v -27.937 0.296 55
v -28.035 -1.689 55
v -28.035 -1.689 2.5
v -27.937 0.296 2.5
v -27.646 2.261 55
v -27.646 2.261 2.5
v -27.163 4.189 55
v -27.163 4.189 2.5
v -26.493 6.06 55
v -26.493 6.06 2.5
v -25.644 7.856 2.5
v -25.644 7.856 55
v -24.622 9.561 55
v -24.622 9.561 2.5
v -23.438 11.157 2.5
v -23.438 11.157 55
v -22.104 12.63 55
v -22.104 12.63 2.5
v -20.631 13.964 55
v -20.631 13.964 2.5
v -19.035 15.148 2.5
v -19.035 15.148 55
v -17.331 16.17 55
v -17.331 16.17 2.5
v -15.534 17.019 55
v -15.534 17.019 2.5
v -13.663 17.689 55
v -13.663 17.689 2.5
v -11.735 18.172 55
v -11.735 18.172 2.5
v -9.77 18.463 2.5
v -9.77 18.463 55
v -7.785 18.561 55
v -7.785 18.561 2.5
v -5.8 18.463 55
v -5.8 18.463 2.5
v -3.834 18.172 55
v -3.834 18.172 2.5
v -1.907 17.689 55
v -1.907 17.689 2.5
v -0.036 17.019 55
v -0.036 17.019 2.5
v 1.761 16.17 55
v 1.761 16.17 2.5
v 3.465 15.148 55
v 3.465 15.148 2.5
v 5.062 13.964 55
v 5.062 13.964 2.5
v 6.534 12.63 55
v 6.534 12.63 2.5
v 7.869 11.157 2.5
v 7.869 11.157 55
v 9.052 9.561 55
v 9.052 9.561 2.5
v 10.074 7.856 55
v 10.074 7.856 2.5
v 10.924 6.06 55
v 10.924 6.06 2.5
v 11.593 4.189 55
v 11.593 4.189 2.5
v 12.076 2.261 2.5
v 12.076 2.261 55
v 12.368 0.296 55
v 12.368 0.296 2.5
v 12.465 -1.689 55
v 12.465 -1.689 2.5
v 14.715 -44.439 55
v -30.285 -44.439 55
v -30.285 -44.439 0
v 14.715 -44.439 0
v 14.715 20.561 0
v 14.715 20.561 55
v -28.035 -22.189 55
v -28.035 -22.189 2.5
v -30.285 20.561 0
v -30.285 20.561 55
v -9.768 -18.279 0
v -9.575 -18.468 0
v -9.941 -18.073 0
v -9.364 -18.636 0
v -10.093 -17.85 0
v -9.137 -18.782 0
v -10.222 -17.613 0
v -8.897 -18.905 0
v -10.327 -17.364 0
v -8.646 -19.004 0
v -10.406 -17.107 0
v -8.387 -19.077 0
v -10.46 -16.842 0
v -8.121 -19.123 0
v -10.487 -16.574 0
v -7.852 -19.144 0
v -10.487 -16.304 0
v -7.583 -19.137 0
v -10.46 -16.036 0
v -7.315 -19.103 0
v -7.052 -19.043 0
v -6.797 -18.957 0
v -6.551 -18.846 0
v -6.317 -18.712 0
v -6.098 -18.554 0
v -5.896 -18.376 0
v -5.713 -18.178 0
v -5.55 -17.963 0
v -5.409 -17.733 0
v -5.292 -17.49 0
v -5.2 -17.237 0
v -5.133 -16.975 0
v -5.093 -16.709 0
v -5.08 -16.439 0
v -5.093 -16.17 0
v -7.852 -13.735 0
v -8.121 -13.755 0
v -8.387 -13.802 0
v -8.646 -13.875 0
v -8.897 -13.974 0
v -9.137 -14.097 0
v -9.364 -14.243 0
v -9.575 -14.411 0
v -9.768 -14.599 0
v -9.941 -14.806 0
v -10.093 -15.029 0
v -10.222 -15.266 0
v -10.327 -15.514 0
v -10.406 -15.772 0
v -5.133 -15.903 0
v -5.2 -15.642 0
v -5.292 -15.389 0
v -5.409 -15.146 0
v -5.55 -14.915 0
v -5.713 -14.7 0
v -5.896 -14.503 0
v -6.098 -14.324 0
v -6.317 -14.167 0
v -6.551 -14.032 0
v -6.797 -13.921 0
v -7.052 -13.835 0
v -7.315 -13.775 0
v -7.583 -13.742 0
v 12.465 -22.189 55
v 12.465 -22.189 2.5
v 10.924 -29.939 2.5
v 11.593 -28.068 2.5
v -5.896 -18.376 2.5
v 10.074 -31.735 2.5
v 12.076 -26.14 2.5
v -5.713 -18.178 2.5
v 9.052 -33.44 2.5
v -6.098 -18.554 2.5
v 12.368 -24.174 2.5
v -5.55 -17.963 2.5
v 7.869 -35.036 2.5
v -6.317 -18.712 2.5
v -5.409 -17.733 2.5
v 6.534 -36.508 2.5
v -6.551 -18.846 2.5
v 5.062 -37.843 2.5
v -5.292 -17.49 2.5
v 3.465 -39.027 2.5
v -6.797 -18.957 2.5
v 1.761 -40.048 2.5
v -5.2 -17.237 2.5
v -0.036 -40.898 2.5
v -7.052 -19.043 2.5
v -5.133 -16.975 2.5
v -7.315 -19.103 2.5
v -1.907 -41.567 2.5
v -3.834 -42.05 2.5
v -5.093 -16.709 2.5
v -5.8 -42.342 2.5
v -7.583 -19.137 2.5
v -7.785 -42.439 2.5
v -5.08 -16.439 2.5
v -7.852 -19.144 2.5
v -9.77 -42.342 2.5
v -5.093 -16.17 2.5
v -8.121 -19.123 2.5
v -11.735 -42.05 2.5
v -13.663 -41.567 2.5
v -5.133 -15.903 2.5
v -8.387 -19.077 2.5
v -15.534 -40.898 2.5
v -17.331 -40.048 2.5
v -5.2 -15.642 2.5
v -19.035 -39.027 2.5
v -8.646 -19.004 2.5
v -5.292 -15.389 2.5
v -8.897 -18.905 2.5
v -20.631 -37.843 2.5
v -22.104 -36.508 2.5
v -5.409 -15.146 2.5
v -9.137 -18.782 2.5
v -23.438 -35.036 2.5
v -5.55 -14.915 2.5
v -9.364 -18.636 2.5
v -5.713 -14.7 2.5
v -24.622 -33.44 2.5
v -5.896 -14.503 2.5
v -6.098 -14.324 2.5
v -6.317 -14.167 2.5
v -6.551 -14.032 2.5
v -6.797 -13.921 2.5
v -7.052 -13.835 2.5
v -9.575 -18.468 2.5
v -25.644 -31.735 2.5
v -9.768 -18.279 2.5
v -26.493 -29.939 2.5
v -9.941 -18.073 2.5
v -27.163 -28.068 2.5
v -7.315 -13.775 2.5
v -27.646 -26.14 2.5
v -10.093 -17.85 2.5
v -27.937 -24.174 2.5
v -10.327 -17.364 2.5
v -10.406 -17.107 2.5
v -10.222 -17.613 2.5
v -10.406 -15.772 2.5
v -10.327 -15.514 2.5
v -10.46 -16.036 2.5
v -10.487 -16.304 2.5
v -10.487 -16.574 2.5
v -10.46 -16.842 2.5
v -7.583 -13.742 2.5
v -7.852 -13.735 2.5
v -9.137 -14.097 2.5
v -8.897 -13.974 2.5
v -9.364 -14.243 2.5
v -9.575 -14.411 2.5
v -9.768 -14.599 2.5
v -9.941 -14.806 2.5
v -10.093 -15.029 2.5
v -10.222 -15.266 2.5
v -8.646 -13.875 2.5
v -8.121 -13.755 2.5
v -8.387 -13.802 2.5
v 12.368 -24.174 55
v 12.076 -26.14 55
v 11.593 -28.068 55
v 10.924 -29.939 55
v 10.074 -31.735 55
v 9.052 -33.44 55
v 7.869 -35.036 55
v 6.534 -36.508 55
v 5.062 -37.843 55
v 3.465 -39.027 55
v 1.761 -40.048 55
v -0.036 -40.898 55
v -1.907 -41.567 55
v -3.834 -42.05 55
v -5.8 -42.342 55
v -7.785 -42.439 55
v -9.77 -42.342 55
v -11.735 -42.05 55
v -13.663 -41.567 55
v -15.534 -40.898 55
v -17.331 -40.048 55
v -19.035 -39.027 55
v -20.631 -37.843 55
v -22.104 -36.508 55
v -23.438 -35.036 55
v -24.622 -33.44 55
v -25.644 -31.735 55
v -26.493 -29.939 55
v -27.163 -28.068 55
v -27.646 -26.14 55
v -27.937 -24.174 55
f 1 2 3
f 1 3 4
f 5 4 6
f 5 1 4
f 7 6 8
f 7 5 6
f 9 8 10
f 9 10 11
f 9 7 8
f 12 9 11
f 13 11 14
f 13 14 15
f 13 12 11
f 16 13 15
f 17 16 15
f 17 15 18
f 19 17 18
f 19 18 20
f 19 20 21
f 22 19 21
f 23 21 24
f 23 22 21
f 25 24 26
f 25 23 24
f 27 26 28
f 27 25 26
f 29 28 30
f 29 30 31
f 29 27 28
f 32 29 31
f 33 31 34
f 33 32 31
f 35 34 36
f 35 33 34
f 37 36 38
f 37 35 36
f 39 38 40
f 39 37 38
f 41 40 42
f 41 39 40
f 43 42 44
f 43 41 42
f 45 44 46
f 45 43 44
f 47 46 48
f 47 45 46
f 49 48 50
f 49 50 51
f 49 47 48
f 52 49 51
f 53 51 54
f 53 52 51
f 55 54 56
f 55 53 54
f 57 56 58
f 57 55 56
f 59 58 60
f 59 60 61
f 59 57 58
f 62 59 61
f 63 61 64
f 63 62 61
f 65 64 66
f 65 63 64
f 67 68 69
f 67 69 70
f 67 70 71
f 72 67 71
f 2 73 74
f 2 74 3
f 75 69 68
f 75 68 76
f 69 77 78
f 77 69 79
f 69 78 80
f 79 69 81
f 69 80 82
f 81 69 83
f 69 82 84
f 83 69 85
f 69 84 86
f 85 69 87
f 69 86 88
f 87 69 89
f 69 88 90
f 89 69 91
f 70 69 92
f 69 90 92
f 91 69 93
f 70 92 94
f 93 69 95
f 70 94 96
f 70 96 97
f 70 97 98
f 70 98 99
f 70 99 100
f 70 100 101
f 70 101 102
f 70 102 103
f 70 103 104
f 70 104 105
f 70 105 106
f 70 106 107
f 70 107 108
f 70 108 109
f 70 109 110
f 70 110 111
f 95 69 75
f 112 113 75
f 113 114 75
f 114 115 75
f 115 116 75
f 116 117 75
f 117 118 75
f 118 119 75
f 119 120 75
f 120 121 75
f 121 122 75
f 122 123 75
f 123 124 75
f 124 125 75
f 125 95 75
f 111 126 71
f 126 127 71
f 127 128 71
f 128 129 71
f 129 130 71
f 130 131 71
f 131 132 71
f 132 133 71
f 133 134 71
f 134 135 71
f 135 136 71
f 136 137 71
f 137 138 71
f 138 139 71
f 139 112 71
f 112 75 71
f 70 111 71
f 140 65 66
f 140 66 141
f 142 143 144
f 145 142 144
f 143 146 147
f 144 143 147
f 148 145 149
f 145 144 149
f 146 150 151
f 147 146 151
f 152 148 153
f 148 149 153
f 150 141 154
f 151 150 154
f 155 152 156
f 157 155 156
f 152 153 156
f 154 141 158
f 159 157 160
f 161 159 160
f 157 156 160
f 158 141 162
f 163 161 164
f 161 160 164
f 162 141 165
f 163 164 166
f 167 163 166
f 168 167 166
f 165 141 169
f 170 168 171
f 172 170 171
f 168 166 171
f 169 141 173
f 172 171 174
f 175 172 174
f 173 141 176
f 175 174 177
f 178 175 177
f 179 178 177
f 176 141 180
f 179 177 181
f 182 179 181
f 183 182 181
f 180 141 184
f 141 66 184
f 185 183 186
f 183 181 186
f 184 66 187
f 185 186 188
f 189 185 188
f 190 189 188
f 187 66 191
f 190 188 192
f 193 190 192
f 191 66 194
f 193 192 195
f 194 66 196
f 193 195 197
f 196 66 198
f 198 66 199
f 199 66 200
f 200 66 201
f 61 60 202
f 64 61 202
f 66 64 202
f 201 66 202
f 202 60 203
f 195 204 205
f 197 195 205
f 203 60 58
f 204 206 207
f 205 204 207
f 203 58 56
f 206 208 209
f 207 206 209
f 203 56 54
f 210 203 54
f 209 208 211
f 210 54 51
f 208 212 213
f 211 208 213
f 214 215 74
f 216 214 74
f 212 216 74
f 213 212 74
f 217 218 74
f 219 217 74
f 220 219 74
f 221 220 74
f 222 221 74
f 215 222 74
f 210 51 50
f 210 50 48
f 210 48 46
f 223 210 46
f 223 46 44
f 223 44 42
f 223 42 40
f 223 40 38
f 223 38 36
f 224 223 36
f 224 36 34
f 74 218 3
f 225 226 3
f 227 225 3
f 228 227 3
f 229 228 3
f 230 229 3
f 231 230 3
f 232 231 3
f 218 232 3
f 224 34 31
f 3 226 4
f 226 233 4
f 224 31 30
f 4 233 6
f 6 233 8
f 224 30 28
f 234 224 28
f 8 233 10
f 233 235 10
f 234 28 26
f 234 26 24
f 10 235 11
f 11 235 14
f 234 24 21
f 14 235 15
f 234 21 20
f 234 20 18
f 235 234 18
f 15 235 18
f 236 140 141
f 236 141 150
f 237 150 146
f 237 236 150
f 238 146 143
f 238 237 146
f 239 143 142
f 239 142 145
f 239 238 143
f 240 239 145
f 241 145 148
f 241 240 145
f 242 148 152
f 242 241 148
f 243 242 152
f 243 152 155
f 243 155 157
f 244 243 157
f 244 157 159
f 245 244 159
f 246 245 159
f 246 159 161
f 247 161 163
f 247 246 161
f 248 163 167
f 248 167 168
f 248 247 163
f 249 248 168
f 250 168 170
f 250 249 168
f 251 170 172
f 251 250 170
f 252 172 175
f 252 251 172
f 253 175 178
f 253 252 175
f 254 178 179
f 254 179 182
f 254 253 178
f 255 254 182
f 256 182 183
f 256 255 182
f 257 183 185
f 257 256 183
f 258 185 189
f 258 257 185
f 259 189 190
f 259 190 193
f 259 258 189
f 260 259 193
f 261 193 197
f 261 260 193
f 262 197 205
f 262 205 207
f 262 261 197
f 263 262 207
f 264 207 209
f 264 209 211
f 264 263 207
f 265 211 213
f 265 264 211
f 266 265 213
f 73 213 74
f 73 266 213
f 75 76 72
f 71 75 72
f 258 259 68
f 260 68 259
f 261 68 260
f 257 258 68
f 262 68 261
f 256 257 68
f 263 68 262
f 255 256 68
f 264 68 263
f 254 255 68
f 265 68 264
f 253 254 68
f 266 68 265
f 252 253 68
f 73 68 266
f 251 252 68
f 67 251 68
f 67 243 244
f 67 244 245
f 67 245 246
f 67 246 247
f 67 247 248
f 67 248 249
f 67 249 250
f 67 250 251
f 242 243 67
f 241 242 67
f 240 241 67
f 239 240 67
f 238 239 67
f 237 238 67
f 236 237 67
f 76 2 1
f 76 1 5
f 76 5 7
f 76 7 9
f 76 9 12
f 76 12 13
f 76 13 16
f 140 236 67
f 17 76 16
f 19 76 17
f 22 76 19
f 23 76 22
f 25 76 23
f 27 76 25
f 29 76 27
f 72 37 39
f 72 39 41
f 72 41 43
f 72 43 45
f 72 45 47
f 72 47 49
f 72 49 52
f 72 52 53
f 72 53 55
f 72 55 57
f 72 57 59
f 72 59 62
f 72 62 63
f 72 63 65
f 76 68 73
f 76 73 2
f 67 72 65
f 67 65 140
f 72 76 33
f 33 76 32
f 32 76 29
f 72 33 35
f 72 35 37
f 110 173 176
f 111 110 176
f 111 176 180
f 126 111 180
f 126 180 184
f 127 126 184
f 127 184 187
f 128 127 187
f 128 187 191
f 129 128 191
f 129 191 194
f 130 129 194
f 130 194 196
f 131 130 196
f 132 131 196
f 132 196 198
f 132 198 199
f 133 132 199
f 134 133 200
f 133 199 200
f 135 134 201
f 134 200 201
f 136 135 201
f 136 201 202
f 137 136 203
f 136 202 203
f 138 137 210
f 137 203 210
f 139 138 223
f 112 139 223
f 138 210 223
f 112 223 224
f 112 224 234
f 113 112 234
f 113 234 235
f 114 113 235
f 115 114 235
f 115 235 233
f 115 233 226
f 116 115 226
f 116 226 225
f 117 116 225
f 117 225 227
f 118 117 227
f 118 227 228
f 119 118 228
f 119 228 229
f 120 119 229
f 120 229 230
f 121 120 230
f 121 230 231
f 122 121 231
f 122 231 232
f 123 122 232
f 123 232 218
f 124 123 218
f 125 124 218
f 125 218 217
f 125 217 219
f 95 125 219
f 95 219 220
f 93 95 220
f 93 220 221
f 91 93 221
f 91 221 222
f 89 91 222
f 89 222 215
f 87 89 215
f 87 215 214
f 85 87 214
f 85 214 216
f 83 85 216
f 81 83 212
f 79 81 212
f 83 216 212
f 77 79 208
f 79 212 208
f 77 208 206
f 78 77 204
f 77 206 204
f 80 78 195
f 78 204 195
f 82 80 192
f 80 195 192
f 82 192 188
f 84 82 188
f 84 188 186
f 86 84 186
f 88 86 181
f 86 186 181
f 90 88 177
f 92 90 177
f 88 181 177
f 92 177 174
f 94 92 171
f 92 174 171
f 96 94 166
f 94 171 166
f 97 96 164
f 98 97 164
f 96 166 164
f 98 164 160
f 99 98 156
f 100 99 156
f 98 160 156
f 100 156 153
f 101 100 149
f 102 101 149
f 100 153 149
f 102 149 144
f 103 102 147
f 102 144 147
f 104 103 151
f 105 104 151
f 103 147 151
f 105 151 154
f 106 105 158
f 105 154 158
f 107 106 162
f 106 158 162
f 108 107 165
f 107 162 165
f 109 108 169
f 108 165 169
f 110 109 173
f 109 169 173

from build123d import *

# Parameters (mm, degrees)
SKETCH4_W               = 45
SKETCH4_H               = 65
BOSS_EXTRUDE2_DEPTH     = 55
CUT_EXTRUDE1_DEPTH      = 52.5
F_1_4_28_TAPPED_HOLE1_D = 5.4102


with BuildPart() as part:
    # Sketch4 → Boss-Extrude2 (new body)
    with BuildSketch(Plane.XY):
        with Locations((-7.784904398, -11.939291809)):
            Rectangle(SKETCH4_W, SKETCH4_H)
    extrude(amount=BOSS_EXTRUDE2_DEPTH)

    # Sketch5 → Cut-Extrude1 (cut)
    with BuildSketch(Plane.XY.offset(55)):
        with BuildLine():
            Line((-28.034904398, -22.189291809), (-28.034904398, -1.689291809))
            ThreePointArc((-28.034904398, -1.689291809), (-7.784904398, 18.560708191), (12.465095602, -1.689291809))
            Line((12.465095602, -1.689291809), (12.465095602, -22.189291809))
            ThreePointArc((12.465095602, -22.189291809), (-7.784904398, -42.439291809), (-28.034904398, -22.189291809))
        make_face()
    extrude(amount=-CUT_EXTRUDE1_DEPTH, mode=Mode.SUBTRACT)

    # 1/4-28 Tapped Hole1 (through all)
    with Locations(Plane(origin=(0, 0, 0), x_dir=(-1, 0, 0), z_dir=(0, 0, -1))):
        with Locations((7.784904398, -16.439291809)):
            Hole(F_1_4_28_TAPPED_HOLE1_D / 2)


solid = part.part
